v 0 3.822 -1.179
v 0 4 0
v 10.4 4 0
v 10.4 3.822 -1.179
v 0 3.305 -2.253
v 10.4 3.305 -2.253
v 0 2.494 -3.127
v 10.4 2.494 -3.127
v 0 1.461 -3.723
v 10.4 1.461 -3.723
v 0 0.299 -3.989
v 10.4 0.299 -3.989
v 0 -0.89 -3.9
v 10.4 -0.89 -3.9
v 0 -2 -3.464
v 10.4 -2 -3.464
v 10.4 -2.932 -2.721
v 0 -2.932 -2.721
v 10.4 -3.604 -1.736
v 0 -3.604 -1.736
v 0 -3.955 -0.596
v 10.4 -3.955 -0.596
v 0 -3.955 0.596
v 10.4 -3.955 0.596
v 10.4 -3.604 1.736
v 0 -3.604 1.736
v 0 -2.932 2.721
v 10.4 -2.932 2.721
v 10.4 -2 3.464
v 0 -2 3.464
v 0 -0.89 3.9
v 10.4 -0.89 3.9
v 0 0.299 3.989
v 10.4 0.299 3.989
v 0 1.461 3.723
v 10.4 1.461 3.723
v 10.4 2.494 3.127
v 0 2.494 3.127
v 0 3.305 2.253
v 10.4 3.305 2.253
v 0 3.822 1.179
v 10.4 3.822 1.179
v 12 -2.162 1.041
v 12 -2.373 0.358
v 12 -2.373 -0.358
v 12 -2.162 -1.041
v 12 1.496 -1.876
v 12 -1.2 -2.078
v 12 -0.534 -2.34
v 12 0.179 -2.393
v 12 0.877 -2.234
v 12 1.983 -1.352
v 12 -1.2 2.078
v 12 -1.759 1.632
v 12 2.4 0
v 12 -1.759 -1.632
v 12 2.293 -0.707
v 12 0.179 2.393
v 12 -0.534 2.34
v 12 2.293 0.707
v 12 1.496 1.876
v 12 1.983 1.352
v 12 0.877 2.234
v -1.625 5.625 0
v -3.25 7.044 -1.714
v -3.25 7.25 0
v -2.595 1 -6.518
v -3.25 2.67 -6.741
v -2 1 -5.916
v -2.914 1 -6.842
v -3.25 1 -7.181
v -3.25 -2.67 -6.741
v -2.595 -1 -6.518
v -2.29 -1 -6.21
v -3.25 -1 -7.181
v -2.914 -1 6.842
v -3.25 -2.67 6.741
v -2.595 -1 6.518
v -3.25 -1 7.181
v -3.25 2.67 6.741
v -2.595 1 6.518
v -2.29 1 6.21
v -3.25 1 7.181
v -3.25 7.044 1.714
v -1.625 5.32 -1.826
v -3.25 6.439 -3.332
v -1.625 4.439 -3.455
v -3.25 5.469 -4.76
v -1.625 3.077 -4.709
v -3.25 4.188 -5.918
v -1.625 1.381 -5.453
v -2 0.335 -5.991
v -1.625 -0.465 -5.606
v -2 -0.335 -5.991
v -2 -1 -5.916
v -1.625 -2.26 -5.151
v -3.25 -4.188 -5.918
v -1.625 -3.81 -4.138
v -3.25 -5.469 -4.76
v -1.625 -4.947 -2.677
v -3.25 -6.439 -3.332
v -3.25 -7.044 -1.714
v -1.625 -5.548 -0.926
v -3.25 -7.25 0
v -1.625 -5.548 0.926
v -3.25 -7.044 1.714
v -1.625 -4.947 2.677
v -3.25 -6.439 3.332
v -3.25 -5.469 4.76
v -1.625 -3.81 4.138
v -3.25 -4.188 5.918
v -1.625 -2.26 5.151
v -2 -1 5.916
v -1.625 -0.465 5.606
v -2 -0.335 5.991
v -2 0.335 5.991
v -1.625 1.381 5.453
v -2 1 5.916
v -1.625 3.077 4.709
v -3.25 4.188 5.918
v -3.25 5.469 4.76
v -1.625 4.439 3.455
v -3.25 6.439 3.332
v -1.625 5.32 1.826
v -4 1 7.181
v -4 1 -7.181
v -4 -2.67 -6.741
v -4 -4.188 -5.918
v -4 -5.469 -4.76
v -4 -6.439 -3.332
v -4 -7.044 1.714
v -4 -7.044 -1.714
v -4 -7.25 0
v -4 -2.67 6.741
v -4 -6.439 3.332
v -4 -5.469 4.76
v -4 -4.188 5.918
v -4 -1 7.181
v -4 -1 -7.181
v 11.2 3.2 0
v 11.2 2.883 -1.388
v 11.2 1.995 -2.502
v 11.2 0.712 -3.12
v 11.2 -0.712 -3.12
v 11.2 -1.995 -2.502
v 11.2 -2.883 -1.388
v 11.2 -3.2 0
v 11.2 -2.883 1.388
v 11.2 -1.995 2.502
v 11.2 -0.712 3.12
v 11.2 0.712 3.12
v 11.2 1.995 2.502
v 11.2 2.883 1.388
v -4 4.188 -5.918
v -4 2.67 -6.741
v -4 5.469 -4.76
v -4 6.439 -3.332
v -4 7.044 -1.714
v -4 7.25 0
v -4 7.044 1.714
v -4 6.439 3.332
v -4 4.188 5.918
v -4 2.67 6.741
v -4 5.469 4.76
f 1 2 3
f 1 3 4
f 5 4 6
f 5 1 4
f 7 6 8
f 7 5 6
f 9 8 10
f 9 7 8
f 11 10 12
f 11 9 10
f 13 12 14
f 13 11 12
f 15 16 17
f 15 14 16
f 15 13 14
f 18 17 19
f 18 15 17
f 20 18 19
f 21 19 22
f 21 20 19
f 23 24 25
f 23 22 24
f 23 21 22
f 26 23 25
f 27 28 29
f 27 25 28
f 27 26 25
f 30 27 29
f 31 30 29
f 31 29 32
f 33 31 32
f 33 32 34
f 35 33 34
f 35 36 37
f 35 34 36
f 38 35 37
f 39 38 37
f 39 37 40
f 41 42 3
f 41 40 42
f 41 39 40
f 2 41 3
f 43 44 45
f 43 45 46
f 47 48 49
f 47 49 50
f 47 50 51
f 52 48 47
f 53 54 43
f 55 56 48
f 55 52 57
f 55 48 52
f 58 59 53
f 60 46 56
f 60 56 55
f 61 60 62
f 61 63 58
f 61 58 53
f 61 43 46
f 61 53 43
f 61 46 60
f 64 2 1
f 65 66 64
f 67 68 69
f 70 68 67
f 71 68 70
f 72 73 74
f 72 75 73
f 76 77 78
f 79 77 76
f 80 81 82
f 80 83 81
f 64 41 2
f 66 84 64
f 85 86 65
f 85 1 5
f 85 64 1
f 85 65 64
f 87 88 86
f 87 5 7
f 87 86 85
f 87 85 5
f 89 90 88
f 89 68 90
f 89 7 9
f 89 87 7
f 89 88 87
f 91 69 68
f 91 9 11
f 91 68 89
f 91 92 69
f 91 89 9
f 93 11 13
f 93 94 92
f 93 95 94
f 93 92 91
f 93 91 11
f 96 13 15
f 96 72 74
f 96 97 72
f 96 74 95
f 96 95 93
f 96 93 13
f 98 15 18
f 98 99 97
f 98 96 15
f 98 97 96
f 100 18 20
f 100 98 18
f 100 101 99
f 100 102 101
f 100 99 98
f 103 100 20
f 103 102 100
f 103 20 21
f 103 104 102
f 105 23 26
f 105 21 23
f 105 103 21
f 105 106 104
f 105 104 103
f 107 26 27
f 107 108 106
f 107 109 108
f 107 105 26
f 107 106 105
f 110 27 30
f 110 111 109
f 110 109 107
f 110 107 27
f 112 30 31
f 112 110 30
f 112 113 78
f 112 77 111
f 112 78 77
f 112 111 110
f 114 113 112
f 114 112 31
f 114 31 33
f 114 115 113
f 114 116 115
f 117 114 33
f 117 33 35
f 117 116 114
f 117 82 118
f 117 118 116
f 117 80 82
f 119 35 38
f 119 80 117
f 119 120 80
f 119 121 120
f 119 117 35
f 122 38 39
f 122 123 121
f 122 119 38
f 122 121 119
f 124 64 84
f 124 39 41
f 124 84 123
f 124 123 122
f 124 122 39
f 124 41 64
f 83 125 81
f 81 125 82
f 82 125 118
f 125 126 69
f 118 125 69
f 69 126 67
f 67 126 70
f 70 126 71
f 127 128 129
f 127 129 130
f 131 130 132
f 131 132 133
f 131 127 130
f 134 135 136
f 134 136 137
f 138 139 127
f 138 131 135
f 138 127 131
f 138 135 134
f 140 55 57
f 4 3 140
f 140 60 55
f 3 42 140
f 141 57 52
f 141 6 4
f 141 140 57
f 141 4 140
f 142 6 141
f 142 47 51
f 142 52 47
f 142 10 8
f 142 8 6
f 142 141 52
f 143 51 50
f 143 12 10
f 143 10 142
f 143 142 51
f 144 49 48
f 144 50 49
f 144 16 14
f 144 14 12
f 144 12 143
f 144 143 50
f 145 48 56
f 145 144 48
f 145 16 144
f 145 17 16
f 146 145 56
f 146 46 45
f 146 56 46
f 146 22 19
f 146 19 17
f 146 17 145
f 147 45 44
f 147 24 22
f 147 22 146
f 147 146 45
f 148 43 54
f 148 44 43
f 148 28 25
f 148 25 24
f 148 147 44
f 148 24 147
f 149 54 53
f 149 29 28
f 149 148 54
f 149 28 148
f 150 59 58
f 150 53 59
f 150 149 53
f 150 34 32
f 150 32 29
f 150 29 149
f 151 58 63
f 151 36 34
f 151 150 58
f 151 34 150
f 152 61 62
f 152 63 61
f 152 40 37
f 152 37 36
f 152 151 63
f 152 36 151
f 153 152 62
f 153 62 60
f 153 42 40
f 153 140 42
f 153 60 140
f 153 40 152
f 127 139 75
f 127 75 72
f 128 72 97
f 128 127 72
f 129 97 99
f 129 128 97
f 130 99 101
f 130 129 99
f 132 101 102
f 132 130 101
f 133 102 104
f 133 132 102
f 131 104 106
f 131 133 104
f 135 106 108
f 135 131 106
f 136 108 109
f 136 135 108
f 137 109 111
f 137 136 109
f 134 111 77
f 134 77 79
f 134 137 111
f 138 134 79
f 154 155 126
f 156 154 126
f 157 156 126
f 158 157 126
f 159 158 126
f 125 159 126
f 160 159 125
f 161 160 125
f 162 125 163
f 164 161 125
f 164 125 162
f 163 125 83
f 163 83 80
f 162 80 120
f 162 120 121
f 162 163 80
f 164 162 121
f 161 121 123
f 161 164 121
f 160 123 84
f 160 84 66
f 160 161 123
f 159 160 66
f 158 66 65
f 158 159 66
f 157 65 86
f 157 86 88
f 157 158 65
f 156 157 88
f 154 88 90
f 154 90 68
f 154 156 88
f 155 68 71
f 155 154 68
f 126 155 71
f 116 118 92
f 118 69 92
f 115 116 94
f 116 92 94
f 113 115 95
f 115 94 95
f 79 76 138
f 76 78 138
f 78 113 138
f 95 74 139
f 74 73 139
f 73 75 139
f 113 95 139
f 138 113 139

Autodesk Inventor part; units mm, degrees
ref_plane "YZ Plane" through (0, 0, 0) normal (1, 0, 0) x (0, 1, 0)
ref_plane "XZ Plane" through (0, 0, 0) normal (0, 1, 0) x (-1, 0, 0)
ref_plane "XY Plane" through (0, 0, 0) normal (0, 0, 1) x (1, 0, 0)
sketch "Эскиз1" plane through (0, 0, 0) normal (1, 0, 0) x (0, 1, 0)
  circle A0 centre (0, 0) radius 4
  dimension "d0" = 8
extrude "Выдавливание1" add sketch "Эскиз1" along normal blind 12
chamfer "Фаска1" distance 1.6 angle 45 1 edges at (12, -4, 0)
thread "Резьба1" size "M8x1.25" class "6g" standard "ANSI Metric M Profile" full length
sketch "Эскиз2" plane through (0, 0, 0) normal (0, 0, 1) x (1, 0, 0)
  line L0 (0, 4) -> (0, -4) projected
  line L1 (0, 0) -> (0, 4)
  line L2 (0, 4) -> (-4, 8)
  line L3 (0, 4) -> (5.6569, 4) construction
  line L4 (-4, 8) -> (-4, 4)
  line L5 (-4, 0) -> (0, 0)
  line L6 (0, 4) -> (0, 0)
  line L7 (-4, 0) -> (-4, 4)
  dimension "d8" = 4
  dimension "d9" = 135
revolve "Вращение1" add sketch "Эскиз2" angle 360 about axis through (-4, 0, 0) along (1, 0, 0)
sketch "Эскиз3" plane through (-4, 0, 0) normal (-1, 0, 0) x (0, 0, 1)
  circle A0 centre (0, 0) radius 7.25
  dimension "d11" = 14.5
extrude "Выдавливание2" cut sketch "Эскиз3" against normal blind 25.25 keep common part
sketch "Эскиз4" plane through (0, 0, 0) normal (0, 0, 1) x (1, 0, 0)
  line L0 (-6, 1) -> (-2, 1)
  line L1 (-2, 1) -> (-2, -1)
  line L2 (-2, -1) -> (-6, -1)
  line L3 (-6, -1) -> (-6, 1)
  line L4 (-4, -7.25) -> (-4, 7.25) projected
  line L5 (-6, 1) -> (-2, -1) construction
  line L6 (-2, 1) -> (-6, -1) construction
  point P0 (0, 0)
  point P1 (-4, 0)
  dimension "d14" = 4
  dimension "d15" = 2
extrude "Выдавливание3" cut sketch "Эскиз4" along normal mid plane 25.25
properties part number "винт"
